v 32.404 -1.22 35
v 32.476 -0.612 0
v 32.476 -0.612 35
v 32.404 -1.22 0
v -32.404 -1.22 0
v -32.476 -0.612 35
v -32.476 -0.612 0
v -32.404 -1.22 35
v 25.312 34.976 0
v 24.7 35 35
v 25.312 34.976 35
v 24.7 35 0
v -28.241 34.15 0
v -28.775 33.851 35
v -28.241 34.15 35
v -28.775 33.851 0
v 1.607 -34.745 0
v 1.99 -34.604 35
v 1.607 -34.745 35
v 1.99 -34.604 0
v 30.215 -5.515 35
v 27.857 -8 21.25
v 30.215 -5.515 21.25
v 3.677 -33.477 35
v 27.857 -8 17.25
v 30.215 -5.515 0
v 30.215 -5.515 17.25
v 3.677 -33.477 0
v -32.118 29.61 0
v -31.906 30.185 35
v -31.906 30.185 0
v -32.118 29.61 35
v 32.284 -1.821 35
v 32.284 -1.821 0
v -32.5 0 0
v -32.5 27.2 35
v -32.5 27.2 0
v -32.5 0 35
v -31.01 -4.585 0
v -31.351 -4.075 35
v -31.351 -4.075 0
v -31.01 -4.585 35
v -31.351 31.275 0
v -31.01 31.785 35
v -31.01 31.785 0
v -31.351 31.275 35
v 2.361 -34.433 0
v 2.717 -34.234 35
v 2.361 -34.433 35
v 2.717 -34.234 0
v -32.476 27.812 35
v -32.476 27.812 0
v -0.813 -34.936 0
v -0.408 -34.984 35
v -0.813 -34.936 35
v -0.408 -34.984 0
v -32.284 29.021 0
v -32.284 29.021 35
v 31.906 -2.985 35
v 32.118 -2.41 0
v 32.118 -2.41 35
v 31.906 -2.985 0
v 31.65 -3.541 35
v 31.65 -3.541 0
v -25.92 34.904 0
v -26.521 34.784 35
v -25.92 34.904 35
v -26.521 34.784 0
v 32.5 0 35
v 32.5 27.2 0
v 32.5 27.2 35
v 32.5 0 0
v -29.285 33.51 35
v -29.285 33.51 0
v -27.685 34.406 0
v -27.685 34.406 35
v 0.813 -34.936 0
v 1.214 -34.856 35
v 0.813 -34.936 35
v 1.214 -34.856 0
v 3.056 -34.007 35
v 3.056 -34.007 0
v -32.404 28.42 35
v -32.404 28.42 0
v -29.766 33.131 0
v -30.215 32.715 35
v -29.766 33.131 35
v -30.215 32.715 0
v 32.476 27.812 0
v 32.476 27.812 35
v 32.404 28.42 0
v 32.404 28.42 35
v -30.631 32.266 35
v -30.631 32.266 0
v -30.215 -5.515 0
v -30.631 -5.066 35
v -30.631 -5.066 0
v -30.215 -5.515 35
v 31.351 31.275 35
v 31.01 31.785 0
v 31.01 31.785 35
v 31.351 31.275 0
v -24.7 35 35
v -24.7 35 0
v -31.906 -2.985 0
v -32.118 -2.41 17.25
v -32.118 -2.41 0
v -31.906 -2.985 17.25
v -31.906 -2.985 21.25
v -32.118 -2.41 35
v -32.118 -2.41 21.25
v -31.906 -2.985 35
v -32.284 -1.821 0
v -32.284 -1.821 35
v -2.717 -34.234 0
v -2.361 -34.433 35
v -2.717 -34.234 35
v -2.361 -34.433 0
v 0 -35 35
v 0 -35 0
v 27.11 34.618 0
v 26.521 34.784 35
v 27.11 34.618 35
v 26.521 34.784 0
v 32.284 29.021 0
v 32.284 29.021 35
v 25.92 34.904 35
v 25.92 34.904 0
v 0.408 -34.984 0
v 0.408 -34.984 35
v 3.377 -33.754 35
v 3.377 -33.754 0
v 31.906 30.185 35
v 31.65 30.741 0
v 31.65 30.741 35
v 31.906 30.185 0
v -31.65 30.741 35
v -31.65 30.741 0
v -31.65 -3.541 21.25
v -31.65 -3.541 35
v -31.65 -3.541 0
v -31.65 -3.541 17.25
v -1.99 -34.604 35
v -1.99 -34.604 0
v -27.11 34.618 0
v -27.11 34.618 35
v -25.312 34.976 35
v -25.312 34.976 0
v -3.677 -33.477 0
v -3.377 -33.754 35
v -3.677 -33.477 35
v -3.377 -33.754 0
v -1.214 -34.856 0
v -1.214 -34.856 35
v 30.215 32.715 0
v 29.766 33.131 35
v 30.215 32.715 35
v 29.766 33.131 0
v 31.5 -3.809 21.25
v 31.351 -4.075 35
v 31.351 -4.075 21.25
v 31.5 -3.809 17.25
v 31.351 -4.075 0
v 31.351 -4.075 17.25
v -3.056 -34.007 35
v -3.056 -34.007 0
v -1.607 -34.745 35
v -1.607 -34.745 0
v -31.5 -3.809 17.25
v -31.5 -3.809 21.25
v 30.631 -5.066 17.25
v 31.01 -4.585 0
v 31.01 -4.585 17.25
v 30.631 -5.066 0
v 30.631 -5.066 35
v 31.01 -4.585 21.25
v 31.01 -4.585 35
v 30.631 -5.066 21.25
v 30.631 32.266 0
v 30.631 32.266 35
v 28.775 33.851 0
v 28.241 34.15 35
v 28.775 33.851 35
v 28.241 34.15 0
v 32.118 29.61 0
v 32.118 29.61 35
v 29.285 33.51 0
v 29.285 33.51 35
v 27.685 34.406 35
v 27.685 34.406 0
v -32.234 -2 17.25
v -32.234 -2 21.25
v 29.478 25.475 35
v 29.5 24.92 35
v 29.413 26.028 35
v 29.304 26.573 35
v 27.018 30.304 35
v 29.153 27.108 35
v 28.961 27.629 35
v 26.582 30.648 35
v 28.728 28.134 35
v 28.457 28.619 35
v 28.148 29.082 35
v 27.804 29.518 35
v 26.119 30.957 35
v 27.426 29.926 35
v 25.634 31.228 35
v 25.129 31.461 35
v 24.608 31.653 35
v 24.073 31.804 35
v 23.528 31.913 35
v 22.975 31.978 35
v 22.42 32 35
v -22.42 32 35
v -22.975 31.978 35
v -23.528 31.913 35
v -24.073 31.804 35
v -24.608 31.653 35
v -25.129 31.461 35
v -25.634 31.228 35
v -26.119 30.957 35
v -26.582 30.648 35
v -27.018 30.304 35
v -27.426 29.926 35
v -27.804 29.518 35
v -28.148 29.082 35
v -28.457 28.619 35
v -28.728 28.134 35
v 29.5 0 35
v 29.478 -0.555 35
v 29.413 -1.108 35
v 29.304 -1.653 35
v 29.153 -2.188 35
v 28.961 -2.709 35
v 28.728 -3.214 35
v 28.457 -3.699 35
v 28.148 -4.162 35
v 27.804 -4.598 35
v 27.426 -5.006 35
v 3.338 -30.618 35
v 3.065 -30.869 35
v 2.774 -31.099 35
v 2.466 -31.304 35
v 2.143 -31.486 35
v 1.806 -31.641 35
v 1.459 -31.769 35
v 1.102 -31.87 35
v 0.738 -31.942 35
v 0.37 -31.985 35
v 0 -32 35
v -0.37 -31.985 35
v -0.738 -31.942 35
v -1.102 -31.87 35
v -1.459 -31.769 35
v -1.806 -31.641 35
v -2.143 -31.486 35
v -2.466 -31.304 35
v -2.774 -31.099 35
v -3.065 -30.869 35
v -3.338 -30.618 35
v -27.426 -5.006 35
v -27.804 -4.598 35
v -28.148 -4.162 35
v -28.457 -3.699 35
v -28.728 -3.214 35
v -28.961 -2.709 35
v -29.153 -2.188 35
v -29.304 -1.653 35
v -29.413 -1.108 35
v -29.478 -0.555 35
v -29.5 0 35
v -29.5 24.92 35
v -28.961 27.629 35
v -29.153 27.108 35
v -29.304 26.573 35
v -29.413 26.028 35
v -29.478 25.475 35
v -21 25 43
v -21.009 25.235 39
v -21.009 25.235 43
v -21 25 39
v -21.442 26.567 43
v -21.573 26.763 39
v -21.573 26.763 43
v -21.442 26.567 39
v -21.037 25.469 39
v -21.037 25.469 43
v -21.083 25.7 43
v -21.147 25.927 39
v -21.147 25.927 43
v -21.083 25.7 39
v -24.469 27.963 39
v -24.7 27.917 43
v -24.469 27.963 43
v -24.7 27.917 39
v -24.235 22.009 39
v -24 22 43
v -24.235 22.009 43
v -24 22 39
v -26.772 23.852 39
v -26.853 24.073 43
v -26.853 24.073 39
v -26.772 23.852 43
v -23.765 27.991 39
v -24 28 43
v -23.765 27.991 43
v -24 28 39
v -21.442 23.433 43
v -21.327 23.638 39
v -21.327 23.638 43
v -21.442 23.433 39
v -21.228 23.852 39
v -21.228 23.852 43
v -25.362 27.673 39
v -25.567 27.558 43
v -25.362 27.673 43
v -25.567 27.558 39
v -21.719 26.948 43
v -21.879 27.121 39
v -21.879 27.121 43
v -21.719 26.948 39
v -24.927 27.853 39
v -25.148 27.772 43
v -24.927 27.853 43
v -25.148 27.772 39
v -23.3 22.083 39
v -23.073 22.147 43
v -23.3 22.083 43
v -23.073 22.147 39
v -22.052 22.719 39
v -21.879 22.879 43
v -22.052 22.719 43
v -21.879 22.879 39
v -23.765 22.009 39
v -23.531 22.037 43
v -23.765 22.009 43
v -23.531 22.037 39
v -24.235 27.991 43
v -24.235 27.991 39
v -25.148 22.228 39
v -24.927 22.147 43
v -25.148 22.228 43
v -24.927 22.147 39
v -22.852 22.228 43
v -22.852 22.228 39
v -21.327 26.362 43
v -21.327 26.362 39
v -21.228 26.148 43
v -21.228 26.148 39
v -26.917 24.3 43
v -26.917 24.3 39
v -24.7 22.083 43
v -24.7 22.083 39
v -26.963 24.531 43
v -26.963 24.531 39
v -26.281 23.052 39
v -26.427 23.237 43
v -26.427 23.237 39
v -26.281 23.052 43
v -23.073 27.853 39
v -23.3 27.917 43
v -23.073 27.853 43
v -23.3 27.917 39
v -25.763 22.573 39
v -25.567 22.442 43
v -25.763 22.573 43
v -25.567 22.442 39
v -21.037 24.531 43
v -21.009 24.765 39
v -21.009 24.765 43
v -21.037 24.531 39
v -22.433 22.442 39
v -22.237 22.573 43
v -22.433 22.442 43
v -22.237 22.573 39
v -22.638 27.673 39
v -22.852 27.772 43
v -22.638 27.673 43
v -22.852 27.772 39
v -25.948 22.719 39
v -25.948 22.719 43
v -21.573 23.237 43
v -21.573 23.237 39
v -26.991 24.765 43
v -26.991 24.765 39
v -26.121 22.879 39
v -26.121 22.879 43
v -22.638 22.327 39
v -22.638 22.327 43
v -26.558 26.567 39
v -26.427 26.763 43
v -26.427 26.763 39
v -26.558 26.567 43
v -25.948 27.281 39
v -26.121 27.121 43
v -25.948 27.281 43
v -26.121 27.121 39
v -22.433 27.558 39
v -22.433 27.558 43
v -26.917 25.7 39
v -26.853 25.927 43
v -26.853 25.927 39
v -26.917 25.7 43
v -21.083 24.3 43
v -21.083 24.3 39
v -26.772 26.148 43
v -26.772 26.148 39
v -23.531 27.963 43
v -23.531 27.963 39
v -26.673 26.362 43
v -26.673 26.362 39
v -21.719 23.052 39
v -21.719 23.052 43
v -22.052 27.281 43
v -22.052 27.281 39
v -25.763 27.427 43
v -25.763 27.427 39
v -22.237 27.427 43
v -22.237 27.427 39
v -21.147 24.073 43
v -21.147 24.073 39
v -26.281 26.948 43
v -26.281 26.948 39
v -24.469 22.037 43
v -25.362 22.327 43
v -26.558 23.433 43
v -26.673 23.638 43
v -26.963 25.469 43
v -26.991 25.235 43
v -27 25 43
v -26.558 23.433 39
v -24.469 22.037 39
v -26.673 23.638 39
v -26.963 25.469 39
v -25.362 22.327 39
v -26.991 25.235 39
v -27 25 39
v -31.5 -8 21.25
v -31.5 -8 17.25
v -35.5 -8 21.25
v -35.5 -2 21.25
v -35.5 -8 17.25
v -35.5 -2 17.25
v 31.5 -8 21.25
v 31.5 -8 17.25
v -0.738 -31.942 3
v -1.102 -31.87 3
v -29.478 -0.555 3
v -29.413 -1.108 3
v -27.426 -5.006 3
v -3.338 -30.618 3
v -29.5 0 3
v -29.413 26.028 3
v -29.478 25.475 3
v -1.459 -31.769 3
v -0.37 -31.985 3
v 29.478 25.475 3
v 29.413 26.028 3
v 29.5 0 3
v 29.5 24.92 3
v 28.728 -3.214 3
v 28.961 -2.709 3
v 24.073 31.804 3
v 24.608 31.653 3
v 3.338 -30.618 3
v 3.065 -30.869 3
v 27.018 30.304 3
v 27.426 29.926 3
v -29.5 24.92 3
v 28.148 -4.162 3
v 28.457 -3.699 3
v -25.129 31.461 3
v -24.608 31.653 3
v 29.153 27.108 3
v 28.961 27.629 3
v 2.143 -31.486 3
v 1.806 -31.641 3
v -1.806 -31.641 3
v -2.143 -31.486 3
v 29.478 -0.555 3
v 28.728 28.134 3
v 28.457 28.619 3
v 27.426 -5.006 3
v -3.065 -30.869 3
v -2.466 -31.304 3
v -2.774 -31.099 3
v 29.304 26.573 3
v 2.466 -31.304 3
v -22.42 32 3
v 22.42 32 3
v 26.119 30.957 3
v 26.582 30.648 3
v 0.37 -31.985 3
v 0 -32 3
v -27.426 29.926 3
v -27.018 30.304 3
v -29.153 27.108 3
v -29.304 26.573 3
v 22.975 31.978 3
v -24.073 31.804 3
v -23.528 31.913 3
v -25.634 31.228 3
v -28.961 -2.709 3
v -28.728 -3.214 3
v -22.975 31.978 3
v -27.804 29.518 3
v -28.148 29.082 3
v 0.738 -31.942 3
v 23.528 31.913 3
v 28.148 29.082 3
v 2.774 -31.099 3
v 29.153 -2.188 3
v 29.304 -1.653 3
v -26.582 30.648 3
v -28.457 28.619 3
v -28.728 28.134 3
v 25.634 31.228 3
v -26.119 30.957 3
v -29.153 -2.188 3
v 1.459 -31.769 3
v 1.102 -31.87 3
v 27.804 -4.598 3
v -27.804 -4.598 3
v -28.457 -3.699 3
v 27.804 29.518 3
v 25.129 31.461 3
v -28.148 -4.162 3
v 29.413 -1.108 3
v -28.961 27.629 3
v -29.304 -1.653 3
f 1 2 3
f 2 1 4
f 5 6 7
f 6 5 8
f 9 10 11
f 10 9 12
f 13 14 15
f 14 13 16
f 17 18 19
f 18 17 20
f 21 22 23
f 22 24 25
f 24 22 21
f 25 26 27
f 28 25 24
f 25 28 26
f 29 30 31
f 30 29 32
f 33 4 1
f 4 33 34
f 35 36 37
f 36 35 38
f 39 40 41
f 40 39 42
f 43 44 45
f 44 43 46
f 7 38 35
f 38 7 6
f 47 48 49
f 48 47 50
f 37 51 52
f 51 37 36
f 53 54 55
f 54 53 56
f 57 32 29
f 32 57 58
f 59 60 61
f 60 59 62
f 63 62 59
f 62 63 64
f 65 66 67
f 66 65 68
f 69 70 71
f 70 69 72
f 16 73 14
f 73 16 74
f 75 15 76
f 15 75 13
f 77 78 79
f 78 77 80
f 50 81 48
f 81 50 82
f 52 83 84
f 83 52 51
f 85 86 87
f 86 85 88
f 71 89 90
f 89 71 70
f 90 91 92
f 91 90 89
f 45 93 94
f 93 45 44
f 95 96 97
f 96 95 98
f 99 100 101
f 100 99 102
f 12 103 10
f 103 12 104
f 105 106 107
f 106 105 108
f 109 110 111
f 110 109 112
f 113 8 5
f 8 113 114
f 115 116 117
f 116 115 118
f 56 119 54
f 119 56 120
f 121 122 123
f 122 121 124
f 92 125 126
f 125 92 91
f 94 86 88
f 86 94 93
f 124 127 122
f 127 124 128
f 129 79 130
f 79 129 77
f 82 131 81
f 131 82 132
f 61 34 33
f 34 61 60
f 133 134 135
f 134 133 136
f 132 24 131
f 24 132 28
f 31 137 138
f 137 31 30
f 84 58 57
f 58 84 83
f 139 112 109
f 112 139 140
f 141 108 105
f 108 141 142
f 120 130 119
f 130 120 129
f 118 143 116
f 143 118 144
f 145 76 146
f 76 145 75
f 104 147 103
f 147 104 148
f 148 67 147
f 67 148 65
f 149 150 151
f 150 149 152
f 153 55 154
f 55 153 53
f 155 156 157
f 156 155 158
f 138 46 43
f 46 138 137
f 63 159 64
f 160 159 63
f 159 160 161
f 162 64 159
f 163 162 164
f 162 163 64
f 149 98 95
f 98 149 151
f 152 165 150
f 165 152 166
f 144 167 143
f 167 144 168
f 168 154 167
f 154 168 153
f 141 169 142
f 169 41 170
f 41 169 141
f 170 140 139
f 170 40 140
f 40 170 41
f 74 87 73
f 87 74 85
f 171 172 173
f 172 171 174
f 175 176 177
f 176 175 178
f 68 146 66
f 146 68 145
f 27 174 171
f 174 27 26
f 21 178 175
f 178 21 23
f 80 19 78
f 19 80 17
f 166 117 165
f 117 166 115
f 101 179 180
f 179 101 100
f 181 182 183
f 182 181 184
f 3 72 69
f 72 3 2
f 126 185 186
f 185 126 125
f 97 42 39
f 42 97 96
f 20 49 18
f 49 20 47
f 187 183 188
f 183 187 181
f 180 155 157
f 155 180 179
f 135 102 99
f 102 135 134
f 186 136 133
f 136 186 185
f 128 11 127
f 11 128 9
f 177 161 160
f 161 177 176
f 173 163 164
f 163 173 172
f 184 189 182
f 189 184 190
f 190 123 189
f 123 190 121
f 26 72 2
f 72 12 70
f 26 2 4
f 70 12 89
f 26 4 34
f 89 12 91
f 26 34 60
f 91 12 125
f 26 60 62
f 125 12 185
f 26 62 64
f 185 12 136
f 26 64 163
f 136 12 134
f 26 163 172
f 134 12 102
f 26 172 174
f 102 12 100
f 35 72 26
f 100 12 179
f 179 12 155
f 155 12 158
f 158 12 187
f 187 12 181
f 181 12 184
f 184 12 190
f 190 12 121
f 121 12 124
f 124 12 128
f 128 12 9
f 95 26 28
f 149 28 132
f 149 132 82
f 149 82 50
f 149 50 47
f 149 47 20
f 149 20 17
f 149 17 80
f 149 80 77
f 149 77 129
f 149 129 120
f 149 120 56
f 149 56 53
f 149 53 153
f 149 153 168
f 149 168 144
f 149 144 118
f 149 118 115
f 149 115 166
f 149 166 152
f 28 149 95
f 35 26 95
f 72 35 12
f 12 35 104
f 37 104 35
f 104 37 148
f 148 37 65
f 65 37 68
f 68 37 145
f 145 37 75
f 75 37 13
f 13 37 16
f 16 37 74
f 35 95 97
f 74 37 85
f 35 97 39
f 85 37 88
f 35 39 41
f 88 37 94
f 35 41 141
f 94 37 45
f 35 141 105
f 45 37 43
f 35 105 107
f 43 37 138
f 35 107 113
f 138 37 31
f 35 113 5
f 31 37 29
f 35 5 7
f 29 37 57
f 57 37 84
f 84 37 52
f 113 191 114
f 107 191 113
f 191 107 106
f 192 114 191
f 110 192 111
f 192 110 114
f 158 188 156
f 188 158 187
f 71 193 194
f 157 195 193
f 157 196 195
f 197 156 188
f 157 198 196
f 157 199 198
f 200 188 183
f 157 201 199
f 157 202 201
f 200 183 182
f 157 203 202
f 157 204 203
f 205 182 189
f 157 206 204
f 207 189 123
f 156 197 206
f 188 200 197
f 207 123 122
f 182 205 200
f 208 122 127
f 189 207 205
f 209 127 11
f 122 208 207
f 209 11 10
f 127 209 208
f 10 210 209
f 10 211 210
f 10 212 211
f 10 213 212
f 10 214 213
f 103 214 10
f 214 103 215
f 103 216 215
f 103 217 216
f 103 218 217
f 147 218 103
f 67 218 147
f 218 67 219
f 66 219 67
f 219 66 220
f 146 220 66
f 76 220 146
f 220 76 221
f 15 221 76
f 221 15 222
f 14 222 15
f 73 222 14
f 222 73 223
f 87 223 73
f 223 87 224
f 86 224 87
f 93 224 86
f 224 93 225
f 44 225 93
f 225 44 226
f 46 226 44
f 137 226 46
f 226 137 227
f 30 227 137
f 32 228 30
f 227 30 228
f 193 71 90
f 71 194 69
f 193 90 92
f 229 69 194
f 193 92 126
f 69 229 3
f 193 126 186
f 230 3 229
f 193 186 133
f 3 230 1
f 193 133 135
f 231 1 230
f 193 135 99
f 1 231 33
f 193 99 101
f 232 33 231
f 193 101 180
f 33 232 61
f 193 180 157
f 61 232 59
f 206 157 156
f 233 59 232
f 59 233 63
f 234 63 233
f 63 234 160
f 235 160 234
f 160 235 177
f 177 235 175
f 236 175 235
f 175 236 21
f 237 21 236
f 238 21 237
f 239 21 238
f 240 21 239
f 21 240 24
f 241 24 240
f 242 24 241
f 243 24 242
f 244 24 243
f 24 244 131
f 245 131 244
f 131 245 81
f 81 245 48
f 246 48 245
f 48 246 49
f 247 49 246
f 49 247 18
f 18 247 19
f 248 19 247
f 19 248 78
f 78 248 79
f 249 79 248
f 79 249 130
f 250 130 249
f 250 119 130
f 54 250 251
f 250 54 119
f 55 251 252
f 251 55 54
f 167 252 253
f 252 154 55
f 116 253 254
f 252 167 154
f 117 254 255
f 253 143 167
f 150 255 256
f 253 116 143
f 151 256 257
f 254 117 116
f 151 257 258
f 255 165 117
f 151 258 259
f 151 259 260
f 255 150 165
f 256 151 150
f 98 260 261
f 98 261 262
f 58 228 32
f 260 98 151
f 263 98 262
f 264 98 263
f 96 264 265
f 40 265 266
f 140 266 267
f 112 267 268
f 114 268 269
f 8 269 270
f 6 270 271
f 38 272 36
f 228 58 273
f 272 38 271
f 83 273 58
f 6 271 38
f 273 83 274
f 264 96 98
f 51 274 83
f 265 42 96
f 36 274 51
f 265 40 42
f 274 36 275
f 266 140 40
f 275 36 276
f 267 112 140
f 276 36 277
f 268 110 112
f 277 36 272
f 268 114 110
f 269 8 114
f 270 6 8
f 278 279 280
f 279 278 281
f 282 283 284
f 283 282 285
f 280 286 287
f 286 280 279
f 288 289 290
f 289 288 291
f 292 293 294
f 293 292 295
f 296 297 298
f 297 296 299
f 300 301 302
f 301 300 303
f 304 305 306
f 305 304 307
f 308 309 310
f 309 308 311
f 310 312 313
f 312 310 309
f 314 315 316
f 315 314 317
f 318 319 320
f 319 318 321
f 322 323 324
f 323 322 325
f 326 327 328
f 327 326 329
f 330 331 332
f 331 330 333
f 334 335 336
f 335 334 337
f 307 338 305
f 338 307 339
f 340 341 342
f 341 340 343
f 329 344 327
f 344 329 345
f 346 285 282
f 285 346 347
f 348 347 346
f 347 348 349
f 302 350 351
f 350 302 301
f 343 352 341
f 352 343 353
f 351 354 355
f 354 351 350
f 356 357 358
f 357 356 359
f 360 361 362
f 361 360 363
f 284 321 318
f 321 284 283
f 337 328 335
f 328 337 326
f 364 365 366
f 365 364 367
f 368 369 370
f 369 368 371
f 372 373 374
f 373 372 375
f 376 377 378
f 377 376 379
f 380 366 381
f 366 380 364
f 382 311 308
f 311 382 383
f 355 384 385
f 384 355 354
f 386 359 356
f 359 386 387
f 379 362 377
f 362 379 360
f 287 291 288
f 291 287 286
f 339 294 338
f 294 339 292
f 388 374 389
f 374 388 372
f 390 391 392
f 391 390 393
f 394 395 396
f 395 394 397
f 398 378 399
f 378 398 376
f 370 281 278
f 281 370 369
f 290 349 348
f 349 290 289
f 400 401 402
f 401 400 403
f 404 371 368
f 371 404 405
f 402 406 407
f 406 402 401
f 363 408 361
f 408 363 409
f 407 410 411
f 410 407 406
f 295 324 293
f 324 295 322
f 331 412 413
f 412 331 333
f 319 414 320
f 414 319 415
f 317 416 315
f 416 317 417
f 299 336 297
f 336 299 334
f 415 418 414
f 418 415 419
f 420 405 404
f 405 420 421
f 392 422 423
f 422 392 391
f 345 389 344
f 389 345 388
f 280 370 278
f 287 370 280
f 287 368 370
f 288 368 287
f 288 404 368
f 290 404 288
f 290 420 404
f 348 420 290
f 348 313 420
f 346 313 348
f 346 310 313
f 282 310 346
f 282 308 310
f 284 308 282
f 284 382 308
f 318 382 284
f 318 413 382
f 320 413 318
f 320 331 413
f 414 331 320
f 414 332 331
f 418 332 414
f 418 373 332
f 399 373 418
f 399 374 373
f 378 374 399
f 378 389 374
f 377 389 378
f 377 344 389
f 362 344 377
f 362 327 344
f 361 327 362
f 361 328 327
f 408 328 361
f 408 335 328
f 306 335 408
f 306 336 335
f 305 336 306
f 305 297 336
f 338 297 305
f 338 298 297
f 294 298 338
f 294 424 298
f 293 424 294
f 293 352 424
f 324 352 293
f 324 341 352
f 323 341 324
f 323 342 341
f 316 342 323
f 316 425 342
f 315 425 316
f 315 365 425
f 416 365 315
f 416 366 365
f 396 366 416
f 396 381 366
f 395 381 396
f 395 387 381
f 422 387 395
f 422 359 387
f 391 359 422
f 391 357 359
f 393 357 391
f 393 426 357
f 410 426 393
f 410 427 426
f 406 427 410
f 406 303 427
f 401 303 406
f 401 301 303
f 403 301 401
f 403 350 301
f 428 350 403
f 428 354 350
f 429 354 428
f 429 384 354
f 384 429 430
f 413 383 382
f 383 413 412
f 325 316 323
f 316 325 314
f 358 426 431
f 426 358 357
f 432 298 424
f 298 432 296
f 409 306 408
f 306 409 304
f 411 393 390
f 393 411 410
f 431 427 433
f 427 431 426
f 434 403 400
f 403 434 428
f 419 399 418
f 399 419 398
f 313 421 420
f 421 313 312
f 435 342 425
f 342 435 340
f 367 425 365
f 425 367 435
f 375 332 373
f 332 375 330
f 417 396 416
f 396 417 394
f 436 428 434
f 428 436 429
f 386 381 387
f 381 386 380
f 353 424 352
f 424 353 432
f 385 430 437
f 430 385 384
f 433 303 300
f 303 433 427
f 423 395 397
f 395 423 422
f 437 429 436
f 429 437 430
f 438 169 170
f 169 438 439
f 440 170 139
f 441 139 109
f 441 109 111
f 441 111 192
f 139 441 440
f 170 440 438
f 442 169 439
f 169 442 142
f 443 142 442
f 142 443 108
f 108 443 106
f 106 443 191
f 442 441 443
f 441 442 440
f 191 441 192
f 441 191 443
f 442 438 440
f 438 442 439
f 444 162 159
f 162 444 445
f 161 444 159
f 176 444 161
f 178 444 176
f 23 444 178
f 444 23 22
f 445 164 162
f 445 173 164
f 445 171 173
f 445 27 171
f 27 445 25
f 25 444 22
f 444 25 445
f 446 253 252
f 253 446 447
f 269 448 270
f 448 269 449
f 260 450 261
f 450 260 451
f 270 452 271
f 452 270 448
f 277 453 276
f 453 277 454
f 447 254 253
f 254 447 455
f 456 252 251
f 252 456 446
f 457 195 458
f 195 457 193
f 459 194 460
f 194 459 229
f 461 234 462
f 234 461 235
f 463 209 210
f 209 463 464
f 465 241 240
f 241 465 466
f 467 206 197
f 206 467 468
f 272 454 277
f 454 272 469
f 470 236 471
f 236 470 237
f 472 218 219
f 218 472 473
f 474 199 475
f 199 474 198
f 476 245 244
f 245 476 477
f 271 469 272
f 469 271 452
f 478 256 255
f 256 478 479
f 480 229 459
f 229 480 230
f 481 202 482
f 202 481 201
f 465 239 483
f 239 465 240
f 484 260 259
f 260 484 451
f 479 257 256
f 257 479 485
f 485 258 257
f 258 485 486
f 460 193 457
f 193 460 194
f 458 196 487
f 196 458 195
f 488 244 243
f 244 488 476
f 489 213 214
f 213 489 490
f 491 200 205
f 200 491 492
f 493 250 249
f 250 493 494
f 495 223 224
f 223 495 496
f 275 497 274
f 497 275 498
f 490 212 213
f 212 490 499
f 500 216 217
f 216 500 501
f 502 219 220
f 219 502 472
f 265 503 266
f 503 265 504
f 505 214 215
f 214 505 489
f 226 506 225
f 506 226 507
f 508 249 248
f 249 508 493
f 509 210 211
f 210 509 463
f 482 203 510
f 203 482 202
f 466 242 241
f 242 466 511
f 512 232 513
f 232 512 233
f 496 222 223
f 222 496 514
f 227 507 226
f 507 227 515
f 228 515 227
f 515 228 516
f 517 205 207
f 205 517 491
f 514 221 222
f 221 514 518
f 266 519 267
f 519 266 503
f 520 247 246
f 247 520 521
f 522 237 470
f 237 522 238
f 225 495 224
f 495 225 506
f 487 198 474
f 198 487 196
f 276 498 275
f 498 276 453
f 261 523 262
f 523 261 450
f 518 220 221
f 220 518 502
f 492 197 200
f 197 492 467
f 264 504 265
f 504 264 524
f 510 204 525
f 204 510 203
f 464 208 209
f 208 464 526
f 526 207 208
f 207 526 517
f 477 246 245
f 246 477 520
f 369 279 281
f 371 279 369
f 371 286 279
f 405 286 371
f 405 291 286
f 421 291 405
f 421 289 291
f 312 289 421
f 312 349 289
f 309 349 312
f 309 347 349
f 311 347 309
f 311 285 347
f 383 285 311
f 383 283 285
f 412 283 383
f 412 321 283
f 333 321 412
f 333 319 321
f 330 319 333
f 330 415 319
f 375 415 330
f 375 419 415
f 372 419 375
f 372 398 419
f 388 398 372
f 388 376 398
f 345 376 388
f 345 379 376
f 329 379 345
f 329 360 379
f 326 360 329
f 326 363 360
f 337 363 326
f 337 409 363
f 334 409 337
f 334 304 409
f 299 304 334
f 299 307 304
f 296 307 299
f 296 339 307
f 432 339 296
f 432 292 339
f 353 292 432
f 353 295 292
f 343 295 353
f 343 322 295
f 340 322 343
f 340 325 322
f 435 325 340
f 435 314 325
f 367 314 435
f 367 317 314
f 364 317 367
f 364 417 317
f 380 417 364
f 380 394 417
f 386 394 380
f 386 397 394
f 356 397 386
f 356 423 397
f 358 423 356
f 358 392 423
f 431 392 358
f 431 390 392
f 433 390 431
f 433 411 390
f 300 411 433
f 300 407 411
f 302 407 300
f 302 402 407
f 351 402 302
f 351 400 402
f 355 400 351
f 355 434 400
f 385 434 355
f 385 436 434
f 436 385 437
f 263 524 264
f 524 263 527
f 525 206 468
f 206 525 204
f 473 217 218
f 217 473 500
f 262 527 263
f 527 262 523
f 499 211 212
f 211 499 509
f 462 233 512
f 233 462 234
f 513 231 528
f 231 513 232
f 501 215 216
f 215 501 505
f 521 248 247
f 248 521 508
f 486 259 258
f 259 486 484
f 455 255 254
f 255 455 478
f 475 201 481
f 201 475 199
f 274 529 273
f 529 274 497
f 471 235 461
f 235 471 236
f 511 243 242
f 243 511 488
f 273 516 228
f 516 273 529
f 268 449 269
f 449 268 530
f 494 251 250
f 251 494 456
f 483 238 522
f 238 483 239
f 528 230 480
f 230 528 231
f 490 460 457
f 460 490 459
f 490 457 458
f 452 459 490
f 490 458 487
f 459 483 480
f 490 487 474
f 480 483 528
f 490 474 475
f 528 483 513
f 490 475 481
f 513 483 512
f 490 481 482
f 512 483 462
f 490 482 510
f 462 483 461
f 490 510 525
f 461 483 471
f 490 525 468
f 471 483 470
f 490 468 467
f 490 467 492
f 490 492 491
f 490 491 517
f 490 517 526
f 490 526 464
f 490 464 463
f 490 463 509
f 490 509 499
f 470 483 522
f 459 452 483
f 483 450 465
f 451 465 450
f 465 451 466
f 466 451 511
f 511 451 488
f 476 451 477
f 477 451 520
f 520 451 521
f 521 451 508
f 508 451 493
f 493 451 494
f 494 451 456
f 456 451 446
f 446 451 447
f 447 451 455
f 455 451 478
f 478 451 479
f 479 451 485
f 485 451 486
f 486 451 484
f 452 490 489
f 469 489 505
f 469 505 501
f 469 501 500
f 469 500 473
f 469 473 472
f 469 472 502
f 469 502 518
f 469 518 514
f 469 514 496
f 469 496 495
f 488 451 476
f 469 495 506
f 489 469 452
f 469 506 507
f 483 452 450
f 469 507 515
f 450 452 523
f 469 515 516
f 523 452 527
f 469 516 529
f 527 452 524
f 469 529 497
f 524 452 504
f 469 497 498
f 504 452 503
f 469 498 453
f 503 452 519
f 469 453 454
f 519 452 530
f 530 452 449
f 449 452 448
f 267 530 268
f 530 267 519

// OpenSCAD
// ============================================================
//  Caixa Inferior - Conjunto Mecânico
//  Formato: Escudo/Gota (shield shape)
//  Peça impressa em 3D - rosa/pink
//
//  Medidas estimadas (ajuste com paquímetro):
//    - Largura total:         ~65 mm
//    - Profundidade total:    ~70 mm
//    - Altura total:          ~35 mm
//    - Espessura da parede:   ~3  mm
//    - Espessura do fundo:    ~3  mm
//    - Pino lateral:          diâm. ~6 mm, altura ~8 mm
//    - Encaixes laterais:     ~4 x 4 mm
// ============================================================

// --- Parâmetros (edite conforme medidas do paquímetro) ---
largura         = 65;   // mm - largura máxima da caixa
profundidade    = 70;   // mm - comprimento (frente-trás)
altura          = 35;   // mm - altura total
espessura_parede = 3;   // mm
espessura_fundo  = 3;   // mm

// Pino de alinhamento (canto superior)
pino_diametro   = 6;    // mm
pino_altura     = 8;    // mm
pino_offset_x   = -24; // posição X relativa ao centro
pino_offset_y   = 25;  // posição Y relativa ao centro

// Encaixes laterais (pequenas saliências para travas)
encaixe_w       = 6;    // largura do encaixe
encaixe_h       = 4;    // altura do encaixe
encaixe_d       = 4;    // profundidade (saliência)

$fn = 80;

// ============================================================
//  MÓDULO: Perfil 2D do escudo
//  Forma: retângulo na parte superior + ponta arredondada na base
// ============================================================
module perfil_escudo(w, d) {
    r_topo  = w * 0.12;   // arredondamento dos cantos superiores
    r_base  = w * 0.08;   // arredondamento da ponta inferior

    hull() {
        // Canto superior esquerdo
        translate([-w/2 + r_topo,  d/2 - r_topo])
            circle(r = r_topo);

        // Canto superior direito
        translate([ w/2 - r_topo,  d/2 - r_topo])
            circle(r = r_topo);

        // Ponta inferior (centro) - forma a gota/escudo
        translate([0, -d/2 + r_base])
            circle(r = r_base);

        // Alargamento lateral esquerdo
        translate([-w/2 + r_topo, 0])
            circle(r = r_topo);

        // Alargamento lateral direito
        translate([ w/2 - r_topo, 0])
            circle(r = r_topo);
    }
}

// ============================================================
//  MÓDULO: Caixa (externo - interno = paredes)
// ============================================================
module caixa_escudo() {
    difference() {

        // --- SÓLIDO EXTERNO ---
        union() {
            // Corpo principal extrudado
            linear_extrude(height = altura)
                perfil_escudo(largura, profundidade);

            // Pino de alinhamento (canto superior esquerdo)
            translate([pino_offset_x, pino_offset_y, altura])
                cylinder(h = pino_altura, d = pino_diametro);

            // Encaixe lateral esquerdo (trava para tampa)
            translate([-largura/2 - encaixe_d + espessura_parede,
                       -5,
                        altura * 0.55])
                cube([encaixe_d, encaixe_w, encaixe_h], center = true);

            // Encaixe lateral direito (trava para tampa)
            translate([ largura/2 - espessura_parede,
                       -5,
                        altura * 0.55])
                cube([encaixe_d, encaixe_w, encaixe_h], center = true);
        }

        // --- CAVIDADE INTERNA ---
        // Remove o interior mantendo paredes e fundo
        translate([0, 0, espessura_fundo])
            linear_extrude(height = altura + 1) // +1 para abrir o topo
                perfil_escudo(
                    largura  - 2 * espessura_parede,
                    profundidade - 2 * espessura_parede
                );
    }
}

// ============================================================
//  RENDER
// ============================================================
caixa_escudo();


// ============================================================
//  NOTAS
// ============================================================
// Ajuste os parâmetros no topo conforme as medidas reais
// obtidas com o paquímetro.
//
// Visualizar: F5  |  Renderizar: F6  |  Exportar STL: File > Export
//
// Dica: se a ponta inferior parecer muito afinada ou muito
// arredondada, ajuste o valor de "r_base" dentro do módulo
// perfil_escudo() ou altere "profundidade".
// ============================================================
